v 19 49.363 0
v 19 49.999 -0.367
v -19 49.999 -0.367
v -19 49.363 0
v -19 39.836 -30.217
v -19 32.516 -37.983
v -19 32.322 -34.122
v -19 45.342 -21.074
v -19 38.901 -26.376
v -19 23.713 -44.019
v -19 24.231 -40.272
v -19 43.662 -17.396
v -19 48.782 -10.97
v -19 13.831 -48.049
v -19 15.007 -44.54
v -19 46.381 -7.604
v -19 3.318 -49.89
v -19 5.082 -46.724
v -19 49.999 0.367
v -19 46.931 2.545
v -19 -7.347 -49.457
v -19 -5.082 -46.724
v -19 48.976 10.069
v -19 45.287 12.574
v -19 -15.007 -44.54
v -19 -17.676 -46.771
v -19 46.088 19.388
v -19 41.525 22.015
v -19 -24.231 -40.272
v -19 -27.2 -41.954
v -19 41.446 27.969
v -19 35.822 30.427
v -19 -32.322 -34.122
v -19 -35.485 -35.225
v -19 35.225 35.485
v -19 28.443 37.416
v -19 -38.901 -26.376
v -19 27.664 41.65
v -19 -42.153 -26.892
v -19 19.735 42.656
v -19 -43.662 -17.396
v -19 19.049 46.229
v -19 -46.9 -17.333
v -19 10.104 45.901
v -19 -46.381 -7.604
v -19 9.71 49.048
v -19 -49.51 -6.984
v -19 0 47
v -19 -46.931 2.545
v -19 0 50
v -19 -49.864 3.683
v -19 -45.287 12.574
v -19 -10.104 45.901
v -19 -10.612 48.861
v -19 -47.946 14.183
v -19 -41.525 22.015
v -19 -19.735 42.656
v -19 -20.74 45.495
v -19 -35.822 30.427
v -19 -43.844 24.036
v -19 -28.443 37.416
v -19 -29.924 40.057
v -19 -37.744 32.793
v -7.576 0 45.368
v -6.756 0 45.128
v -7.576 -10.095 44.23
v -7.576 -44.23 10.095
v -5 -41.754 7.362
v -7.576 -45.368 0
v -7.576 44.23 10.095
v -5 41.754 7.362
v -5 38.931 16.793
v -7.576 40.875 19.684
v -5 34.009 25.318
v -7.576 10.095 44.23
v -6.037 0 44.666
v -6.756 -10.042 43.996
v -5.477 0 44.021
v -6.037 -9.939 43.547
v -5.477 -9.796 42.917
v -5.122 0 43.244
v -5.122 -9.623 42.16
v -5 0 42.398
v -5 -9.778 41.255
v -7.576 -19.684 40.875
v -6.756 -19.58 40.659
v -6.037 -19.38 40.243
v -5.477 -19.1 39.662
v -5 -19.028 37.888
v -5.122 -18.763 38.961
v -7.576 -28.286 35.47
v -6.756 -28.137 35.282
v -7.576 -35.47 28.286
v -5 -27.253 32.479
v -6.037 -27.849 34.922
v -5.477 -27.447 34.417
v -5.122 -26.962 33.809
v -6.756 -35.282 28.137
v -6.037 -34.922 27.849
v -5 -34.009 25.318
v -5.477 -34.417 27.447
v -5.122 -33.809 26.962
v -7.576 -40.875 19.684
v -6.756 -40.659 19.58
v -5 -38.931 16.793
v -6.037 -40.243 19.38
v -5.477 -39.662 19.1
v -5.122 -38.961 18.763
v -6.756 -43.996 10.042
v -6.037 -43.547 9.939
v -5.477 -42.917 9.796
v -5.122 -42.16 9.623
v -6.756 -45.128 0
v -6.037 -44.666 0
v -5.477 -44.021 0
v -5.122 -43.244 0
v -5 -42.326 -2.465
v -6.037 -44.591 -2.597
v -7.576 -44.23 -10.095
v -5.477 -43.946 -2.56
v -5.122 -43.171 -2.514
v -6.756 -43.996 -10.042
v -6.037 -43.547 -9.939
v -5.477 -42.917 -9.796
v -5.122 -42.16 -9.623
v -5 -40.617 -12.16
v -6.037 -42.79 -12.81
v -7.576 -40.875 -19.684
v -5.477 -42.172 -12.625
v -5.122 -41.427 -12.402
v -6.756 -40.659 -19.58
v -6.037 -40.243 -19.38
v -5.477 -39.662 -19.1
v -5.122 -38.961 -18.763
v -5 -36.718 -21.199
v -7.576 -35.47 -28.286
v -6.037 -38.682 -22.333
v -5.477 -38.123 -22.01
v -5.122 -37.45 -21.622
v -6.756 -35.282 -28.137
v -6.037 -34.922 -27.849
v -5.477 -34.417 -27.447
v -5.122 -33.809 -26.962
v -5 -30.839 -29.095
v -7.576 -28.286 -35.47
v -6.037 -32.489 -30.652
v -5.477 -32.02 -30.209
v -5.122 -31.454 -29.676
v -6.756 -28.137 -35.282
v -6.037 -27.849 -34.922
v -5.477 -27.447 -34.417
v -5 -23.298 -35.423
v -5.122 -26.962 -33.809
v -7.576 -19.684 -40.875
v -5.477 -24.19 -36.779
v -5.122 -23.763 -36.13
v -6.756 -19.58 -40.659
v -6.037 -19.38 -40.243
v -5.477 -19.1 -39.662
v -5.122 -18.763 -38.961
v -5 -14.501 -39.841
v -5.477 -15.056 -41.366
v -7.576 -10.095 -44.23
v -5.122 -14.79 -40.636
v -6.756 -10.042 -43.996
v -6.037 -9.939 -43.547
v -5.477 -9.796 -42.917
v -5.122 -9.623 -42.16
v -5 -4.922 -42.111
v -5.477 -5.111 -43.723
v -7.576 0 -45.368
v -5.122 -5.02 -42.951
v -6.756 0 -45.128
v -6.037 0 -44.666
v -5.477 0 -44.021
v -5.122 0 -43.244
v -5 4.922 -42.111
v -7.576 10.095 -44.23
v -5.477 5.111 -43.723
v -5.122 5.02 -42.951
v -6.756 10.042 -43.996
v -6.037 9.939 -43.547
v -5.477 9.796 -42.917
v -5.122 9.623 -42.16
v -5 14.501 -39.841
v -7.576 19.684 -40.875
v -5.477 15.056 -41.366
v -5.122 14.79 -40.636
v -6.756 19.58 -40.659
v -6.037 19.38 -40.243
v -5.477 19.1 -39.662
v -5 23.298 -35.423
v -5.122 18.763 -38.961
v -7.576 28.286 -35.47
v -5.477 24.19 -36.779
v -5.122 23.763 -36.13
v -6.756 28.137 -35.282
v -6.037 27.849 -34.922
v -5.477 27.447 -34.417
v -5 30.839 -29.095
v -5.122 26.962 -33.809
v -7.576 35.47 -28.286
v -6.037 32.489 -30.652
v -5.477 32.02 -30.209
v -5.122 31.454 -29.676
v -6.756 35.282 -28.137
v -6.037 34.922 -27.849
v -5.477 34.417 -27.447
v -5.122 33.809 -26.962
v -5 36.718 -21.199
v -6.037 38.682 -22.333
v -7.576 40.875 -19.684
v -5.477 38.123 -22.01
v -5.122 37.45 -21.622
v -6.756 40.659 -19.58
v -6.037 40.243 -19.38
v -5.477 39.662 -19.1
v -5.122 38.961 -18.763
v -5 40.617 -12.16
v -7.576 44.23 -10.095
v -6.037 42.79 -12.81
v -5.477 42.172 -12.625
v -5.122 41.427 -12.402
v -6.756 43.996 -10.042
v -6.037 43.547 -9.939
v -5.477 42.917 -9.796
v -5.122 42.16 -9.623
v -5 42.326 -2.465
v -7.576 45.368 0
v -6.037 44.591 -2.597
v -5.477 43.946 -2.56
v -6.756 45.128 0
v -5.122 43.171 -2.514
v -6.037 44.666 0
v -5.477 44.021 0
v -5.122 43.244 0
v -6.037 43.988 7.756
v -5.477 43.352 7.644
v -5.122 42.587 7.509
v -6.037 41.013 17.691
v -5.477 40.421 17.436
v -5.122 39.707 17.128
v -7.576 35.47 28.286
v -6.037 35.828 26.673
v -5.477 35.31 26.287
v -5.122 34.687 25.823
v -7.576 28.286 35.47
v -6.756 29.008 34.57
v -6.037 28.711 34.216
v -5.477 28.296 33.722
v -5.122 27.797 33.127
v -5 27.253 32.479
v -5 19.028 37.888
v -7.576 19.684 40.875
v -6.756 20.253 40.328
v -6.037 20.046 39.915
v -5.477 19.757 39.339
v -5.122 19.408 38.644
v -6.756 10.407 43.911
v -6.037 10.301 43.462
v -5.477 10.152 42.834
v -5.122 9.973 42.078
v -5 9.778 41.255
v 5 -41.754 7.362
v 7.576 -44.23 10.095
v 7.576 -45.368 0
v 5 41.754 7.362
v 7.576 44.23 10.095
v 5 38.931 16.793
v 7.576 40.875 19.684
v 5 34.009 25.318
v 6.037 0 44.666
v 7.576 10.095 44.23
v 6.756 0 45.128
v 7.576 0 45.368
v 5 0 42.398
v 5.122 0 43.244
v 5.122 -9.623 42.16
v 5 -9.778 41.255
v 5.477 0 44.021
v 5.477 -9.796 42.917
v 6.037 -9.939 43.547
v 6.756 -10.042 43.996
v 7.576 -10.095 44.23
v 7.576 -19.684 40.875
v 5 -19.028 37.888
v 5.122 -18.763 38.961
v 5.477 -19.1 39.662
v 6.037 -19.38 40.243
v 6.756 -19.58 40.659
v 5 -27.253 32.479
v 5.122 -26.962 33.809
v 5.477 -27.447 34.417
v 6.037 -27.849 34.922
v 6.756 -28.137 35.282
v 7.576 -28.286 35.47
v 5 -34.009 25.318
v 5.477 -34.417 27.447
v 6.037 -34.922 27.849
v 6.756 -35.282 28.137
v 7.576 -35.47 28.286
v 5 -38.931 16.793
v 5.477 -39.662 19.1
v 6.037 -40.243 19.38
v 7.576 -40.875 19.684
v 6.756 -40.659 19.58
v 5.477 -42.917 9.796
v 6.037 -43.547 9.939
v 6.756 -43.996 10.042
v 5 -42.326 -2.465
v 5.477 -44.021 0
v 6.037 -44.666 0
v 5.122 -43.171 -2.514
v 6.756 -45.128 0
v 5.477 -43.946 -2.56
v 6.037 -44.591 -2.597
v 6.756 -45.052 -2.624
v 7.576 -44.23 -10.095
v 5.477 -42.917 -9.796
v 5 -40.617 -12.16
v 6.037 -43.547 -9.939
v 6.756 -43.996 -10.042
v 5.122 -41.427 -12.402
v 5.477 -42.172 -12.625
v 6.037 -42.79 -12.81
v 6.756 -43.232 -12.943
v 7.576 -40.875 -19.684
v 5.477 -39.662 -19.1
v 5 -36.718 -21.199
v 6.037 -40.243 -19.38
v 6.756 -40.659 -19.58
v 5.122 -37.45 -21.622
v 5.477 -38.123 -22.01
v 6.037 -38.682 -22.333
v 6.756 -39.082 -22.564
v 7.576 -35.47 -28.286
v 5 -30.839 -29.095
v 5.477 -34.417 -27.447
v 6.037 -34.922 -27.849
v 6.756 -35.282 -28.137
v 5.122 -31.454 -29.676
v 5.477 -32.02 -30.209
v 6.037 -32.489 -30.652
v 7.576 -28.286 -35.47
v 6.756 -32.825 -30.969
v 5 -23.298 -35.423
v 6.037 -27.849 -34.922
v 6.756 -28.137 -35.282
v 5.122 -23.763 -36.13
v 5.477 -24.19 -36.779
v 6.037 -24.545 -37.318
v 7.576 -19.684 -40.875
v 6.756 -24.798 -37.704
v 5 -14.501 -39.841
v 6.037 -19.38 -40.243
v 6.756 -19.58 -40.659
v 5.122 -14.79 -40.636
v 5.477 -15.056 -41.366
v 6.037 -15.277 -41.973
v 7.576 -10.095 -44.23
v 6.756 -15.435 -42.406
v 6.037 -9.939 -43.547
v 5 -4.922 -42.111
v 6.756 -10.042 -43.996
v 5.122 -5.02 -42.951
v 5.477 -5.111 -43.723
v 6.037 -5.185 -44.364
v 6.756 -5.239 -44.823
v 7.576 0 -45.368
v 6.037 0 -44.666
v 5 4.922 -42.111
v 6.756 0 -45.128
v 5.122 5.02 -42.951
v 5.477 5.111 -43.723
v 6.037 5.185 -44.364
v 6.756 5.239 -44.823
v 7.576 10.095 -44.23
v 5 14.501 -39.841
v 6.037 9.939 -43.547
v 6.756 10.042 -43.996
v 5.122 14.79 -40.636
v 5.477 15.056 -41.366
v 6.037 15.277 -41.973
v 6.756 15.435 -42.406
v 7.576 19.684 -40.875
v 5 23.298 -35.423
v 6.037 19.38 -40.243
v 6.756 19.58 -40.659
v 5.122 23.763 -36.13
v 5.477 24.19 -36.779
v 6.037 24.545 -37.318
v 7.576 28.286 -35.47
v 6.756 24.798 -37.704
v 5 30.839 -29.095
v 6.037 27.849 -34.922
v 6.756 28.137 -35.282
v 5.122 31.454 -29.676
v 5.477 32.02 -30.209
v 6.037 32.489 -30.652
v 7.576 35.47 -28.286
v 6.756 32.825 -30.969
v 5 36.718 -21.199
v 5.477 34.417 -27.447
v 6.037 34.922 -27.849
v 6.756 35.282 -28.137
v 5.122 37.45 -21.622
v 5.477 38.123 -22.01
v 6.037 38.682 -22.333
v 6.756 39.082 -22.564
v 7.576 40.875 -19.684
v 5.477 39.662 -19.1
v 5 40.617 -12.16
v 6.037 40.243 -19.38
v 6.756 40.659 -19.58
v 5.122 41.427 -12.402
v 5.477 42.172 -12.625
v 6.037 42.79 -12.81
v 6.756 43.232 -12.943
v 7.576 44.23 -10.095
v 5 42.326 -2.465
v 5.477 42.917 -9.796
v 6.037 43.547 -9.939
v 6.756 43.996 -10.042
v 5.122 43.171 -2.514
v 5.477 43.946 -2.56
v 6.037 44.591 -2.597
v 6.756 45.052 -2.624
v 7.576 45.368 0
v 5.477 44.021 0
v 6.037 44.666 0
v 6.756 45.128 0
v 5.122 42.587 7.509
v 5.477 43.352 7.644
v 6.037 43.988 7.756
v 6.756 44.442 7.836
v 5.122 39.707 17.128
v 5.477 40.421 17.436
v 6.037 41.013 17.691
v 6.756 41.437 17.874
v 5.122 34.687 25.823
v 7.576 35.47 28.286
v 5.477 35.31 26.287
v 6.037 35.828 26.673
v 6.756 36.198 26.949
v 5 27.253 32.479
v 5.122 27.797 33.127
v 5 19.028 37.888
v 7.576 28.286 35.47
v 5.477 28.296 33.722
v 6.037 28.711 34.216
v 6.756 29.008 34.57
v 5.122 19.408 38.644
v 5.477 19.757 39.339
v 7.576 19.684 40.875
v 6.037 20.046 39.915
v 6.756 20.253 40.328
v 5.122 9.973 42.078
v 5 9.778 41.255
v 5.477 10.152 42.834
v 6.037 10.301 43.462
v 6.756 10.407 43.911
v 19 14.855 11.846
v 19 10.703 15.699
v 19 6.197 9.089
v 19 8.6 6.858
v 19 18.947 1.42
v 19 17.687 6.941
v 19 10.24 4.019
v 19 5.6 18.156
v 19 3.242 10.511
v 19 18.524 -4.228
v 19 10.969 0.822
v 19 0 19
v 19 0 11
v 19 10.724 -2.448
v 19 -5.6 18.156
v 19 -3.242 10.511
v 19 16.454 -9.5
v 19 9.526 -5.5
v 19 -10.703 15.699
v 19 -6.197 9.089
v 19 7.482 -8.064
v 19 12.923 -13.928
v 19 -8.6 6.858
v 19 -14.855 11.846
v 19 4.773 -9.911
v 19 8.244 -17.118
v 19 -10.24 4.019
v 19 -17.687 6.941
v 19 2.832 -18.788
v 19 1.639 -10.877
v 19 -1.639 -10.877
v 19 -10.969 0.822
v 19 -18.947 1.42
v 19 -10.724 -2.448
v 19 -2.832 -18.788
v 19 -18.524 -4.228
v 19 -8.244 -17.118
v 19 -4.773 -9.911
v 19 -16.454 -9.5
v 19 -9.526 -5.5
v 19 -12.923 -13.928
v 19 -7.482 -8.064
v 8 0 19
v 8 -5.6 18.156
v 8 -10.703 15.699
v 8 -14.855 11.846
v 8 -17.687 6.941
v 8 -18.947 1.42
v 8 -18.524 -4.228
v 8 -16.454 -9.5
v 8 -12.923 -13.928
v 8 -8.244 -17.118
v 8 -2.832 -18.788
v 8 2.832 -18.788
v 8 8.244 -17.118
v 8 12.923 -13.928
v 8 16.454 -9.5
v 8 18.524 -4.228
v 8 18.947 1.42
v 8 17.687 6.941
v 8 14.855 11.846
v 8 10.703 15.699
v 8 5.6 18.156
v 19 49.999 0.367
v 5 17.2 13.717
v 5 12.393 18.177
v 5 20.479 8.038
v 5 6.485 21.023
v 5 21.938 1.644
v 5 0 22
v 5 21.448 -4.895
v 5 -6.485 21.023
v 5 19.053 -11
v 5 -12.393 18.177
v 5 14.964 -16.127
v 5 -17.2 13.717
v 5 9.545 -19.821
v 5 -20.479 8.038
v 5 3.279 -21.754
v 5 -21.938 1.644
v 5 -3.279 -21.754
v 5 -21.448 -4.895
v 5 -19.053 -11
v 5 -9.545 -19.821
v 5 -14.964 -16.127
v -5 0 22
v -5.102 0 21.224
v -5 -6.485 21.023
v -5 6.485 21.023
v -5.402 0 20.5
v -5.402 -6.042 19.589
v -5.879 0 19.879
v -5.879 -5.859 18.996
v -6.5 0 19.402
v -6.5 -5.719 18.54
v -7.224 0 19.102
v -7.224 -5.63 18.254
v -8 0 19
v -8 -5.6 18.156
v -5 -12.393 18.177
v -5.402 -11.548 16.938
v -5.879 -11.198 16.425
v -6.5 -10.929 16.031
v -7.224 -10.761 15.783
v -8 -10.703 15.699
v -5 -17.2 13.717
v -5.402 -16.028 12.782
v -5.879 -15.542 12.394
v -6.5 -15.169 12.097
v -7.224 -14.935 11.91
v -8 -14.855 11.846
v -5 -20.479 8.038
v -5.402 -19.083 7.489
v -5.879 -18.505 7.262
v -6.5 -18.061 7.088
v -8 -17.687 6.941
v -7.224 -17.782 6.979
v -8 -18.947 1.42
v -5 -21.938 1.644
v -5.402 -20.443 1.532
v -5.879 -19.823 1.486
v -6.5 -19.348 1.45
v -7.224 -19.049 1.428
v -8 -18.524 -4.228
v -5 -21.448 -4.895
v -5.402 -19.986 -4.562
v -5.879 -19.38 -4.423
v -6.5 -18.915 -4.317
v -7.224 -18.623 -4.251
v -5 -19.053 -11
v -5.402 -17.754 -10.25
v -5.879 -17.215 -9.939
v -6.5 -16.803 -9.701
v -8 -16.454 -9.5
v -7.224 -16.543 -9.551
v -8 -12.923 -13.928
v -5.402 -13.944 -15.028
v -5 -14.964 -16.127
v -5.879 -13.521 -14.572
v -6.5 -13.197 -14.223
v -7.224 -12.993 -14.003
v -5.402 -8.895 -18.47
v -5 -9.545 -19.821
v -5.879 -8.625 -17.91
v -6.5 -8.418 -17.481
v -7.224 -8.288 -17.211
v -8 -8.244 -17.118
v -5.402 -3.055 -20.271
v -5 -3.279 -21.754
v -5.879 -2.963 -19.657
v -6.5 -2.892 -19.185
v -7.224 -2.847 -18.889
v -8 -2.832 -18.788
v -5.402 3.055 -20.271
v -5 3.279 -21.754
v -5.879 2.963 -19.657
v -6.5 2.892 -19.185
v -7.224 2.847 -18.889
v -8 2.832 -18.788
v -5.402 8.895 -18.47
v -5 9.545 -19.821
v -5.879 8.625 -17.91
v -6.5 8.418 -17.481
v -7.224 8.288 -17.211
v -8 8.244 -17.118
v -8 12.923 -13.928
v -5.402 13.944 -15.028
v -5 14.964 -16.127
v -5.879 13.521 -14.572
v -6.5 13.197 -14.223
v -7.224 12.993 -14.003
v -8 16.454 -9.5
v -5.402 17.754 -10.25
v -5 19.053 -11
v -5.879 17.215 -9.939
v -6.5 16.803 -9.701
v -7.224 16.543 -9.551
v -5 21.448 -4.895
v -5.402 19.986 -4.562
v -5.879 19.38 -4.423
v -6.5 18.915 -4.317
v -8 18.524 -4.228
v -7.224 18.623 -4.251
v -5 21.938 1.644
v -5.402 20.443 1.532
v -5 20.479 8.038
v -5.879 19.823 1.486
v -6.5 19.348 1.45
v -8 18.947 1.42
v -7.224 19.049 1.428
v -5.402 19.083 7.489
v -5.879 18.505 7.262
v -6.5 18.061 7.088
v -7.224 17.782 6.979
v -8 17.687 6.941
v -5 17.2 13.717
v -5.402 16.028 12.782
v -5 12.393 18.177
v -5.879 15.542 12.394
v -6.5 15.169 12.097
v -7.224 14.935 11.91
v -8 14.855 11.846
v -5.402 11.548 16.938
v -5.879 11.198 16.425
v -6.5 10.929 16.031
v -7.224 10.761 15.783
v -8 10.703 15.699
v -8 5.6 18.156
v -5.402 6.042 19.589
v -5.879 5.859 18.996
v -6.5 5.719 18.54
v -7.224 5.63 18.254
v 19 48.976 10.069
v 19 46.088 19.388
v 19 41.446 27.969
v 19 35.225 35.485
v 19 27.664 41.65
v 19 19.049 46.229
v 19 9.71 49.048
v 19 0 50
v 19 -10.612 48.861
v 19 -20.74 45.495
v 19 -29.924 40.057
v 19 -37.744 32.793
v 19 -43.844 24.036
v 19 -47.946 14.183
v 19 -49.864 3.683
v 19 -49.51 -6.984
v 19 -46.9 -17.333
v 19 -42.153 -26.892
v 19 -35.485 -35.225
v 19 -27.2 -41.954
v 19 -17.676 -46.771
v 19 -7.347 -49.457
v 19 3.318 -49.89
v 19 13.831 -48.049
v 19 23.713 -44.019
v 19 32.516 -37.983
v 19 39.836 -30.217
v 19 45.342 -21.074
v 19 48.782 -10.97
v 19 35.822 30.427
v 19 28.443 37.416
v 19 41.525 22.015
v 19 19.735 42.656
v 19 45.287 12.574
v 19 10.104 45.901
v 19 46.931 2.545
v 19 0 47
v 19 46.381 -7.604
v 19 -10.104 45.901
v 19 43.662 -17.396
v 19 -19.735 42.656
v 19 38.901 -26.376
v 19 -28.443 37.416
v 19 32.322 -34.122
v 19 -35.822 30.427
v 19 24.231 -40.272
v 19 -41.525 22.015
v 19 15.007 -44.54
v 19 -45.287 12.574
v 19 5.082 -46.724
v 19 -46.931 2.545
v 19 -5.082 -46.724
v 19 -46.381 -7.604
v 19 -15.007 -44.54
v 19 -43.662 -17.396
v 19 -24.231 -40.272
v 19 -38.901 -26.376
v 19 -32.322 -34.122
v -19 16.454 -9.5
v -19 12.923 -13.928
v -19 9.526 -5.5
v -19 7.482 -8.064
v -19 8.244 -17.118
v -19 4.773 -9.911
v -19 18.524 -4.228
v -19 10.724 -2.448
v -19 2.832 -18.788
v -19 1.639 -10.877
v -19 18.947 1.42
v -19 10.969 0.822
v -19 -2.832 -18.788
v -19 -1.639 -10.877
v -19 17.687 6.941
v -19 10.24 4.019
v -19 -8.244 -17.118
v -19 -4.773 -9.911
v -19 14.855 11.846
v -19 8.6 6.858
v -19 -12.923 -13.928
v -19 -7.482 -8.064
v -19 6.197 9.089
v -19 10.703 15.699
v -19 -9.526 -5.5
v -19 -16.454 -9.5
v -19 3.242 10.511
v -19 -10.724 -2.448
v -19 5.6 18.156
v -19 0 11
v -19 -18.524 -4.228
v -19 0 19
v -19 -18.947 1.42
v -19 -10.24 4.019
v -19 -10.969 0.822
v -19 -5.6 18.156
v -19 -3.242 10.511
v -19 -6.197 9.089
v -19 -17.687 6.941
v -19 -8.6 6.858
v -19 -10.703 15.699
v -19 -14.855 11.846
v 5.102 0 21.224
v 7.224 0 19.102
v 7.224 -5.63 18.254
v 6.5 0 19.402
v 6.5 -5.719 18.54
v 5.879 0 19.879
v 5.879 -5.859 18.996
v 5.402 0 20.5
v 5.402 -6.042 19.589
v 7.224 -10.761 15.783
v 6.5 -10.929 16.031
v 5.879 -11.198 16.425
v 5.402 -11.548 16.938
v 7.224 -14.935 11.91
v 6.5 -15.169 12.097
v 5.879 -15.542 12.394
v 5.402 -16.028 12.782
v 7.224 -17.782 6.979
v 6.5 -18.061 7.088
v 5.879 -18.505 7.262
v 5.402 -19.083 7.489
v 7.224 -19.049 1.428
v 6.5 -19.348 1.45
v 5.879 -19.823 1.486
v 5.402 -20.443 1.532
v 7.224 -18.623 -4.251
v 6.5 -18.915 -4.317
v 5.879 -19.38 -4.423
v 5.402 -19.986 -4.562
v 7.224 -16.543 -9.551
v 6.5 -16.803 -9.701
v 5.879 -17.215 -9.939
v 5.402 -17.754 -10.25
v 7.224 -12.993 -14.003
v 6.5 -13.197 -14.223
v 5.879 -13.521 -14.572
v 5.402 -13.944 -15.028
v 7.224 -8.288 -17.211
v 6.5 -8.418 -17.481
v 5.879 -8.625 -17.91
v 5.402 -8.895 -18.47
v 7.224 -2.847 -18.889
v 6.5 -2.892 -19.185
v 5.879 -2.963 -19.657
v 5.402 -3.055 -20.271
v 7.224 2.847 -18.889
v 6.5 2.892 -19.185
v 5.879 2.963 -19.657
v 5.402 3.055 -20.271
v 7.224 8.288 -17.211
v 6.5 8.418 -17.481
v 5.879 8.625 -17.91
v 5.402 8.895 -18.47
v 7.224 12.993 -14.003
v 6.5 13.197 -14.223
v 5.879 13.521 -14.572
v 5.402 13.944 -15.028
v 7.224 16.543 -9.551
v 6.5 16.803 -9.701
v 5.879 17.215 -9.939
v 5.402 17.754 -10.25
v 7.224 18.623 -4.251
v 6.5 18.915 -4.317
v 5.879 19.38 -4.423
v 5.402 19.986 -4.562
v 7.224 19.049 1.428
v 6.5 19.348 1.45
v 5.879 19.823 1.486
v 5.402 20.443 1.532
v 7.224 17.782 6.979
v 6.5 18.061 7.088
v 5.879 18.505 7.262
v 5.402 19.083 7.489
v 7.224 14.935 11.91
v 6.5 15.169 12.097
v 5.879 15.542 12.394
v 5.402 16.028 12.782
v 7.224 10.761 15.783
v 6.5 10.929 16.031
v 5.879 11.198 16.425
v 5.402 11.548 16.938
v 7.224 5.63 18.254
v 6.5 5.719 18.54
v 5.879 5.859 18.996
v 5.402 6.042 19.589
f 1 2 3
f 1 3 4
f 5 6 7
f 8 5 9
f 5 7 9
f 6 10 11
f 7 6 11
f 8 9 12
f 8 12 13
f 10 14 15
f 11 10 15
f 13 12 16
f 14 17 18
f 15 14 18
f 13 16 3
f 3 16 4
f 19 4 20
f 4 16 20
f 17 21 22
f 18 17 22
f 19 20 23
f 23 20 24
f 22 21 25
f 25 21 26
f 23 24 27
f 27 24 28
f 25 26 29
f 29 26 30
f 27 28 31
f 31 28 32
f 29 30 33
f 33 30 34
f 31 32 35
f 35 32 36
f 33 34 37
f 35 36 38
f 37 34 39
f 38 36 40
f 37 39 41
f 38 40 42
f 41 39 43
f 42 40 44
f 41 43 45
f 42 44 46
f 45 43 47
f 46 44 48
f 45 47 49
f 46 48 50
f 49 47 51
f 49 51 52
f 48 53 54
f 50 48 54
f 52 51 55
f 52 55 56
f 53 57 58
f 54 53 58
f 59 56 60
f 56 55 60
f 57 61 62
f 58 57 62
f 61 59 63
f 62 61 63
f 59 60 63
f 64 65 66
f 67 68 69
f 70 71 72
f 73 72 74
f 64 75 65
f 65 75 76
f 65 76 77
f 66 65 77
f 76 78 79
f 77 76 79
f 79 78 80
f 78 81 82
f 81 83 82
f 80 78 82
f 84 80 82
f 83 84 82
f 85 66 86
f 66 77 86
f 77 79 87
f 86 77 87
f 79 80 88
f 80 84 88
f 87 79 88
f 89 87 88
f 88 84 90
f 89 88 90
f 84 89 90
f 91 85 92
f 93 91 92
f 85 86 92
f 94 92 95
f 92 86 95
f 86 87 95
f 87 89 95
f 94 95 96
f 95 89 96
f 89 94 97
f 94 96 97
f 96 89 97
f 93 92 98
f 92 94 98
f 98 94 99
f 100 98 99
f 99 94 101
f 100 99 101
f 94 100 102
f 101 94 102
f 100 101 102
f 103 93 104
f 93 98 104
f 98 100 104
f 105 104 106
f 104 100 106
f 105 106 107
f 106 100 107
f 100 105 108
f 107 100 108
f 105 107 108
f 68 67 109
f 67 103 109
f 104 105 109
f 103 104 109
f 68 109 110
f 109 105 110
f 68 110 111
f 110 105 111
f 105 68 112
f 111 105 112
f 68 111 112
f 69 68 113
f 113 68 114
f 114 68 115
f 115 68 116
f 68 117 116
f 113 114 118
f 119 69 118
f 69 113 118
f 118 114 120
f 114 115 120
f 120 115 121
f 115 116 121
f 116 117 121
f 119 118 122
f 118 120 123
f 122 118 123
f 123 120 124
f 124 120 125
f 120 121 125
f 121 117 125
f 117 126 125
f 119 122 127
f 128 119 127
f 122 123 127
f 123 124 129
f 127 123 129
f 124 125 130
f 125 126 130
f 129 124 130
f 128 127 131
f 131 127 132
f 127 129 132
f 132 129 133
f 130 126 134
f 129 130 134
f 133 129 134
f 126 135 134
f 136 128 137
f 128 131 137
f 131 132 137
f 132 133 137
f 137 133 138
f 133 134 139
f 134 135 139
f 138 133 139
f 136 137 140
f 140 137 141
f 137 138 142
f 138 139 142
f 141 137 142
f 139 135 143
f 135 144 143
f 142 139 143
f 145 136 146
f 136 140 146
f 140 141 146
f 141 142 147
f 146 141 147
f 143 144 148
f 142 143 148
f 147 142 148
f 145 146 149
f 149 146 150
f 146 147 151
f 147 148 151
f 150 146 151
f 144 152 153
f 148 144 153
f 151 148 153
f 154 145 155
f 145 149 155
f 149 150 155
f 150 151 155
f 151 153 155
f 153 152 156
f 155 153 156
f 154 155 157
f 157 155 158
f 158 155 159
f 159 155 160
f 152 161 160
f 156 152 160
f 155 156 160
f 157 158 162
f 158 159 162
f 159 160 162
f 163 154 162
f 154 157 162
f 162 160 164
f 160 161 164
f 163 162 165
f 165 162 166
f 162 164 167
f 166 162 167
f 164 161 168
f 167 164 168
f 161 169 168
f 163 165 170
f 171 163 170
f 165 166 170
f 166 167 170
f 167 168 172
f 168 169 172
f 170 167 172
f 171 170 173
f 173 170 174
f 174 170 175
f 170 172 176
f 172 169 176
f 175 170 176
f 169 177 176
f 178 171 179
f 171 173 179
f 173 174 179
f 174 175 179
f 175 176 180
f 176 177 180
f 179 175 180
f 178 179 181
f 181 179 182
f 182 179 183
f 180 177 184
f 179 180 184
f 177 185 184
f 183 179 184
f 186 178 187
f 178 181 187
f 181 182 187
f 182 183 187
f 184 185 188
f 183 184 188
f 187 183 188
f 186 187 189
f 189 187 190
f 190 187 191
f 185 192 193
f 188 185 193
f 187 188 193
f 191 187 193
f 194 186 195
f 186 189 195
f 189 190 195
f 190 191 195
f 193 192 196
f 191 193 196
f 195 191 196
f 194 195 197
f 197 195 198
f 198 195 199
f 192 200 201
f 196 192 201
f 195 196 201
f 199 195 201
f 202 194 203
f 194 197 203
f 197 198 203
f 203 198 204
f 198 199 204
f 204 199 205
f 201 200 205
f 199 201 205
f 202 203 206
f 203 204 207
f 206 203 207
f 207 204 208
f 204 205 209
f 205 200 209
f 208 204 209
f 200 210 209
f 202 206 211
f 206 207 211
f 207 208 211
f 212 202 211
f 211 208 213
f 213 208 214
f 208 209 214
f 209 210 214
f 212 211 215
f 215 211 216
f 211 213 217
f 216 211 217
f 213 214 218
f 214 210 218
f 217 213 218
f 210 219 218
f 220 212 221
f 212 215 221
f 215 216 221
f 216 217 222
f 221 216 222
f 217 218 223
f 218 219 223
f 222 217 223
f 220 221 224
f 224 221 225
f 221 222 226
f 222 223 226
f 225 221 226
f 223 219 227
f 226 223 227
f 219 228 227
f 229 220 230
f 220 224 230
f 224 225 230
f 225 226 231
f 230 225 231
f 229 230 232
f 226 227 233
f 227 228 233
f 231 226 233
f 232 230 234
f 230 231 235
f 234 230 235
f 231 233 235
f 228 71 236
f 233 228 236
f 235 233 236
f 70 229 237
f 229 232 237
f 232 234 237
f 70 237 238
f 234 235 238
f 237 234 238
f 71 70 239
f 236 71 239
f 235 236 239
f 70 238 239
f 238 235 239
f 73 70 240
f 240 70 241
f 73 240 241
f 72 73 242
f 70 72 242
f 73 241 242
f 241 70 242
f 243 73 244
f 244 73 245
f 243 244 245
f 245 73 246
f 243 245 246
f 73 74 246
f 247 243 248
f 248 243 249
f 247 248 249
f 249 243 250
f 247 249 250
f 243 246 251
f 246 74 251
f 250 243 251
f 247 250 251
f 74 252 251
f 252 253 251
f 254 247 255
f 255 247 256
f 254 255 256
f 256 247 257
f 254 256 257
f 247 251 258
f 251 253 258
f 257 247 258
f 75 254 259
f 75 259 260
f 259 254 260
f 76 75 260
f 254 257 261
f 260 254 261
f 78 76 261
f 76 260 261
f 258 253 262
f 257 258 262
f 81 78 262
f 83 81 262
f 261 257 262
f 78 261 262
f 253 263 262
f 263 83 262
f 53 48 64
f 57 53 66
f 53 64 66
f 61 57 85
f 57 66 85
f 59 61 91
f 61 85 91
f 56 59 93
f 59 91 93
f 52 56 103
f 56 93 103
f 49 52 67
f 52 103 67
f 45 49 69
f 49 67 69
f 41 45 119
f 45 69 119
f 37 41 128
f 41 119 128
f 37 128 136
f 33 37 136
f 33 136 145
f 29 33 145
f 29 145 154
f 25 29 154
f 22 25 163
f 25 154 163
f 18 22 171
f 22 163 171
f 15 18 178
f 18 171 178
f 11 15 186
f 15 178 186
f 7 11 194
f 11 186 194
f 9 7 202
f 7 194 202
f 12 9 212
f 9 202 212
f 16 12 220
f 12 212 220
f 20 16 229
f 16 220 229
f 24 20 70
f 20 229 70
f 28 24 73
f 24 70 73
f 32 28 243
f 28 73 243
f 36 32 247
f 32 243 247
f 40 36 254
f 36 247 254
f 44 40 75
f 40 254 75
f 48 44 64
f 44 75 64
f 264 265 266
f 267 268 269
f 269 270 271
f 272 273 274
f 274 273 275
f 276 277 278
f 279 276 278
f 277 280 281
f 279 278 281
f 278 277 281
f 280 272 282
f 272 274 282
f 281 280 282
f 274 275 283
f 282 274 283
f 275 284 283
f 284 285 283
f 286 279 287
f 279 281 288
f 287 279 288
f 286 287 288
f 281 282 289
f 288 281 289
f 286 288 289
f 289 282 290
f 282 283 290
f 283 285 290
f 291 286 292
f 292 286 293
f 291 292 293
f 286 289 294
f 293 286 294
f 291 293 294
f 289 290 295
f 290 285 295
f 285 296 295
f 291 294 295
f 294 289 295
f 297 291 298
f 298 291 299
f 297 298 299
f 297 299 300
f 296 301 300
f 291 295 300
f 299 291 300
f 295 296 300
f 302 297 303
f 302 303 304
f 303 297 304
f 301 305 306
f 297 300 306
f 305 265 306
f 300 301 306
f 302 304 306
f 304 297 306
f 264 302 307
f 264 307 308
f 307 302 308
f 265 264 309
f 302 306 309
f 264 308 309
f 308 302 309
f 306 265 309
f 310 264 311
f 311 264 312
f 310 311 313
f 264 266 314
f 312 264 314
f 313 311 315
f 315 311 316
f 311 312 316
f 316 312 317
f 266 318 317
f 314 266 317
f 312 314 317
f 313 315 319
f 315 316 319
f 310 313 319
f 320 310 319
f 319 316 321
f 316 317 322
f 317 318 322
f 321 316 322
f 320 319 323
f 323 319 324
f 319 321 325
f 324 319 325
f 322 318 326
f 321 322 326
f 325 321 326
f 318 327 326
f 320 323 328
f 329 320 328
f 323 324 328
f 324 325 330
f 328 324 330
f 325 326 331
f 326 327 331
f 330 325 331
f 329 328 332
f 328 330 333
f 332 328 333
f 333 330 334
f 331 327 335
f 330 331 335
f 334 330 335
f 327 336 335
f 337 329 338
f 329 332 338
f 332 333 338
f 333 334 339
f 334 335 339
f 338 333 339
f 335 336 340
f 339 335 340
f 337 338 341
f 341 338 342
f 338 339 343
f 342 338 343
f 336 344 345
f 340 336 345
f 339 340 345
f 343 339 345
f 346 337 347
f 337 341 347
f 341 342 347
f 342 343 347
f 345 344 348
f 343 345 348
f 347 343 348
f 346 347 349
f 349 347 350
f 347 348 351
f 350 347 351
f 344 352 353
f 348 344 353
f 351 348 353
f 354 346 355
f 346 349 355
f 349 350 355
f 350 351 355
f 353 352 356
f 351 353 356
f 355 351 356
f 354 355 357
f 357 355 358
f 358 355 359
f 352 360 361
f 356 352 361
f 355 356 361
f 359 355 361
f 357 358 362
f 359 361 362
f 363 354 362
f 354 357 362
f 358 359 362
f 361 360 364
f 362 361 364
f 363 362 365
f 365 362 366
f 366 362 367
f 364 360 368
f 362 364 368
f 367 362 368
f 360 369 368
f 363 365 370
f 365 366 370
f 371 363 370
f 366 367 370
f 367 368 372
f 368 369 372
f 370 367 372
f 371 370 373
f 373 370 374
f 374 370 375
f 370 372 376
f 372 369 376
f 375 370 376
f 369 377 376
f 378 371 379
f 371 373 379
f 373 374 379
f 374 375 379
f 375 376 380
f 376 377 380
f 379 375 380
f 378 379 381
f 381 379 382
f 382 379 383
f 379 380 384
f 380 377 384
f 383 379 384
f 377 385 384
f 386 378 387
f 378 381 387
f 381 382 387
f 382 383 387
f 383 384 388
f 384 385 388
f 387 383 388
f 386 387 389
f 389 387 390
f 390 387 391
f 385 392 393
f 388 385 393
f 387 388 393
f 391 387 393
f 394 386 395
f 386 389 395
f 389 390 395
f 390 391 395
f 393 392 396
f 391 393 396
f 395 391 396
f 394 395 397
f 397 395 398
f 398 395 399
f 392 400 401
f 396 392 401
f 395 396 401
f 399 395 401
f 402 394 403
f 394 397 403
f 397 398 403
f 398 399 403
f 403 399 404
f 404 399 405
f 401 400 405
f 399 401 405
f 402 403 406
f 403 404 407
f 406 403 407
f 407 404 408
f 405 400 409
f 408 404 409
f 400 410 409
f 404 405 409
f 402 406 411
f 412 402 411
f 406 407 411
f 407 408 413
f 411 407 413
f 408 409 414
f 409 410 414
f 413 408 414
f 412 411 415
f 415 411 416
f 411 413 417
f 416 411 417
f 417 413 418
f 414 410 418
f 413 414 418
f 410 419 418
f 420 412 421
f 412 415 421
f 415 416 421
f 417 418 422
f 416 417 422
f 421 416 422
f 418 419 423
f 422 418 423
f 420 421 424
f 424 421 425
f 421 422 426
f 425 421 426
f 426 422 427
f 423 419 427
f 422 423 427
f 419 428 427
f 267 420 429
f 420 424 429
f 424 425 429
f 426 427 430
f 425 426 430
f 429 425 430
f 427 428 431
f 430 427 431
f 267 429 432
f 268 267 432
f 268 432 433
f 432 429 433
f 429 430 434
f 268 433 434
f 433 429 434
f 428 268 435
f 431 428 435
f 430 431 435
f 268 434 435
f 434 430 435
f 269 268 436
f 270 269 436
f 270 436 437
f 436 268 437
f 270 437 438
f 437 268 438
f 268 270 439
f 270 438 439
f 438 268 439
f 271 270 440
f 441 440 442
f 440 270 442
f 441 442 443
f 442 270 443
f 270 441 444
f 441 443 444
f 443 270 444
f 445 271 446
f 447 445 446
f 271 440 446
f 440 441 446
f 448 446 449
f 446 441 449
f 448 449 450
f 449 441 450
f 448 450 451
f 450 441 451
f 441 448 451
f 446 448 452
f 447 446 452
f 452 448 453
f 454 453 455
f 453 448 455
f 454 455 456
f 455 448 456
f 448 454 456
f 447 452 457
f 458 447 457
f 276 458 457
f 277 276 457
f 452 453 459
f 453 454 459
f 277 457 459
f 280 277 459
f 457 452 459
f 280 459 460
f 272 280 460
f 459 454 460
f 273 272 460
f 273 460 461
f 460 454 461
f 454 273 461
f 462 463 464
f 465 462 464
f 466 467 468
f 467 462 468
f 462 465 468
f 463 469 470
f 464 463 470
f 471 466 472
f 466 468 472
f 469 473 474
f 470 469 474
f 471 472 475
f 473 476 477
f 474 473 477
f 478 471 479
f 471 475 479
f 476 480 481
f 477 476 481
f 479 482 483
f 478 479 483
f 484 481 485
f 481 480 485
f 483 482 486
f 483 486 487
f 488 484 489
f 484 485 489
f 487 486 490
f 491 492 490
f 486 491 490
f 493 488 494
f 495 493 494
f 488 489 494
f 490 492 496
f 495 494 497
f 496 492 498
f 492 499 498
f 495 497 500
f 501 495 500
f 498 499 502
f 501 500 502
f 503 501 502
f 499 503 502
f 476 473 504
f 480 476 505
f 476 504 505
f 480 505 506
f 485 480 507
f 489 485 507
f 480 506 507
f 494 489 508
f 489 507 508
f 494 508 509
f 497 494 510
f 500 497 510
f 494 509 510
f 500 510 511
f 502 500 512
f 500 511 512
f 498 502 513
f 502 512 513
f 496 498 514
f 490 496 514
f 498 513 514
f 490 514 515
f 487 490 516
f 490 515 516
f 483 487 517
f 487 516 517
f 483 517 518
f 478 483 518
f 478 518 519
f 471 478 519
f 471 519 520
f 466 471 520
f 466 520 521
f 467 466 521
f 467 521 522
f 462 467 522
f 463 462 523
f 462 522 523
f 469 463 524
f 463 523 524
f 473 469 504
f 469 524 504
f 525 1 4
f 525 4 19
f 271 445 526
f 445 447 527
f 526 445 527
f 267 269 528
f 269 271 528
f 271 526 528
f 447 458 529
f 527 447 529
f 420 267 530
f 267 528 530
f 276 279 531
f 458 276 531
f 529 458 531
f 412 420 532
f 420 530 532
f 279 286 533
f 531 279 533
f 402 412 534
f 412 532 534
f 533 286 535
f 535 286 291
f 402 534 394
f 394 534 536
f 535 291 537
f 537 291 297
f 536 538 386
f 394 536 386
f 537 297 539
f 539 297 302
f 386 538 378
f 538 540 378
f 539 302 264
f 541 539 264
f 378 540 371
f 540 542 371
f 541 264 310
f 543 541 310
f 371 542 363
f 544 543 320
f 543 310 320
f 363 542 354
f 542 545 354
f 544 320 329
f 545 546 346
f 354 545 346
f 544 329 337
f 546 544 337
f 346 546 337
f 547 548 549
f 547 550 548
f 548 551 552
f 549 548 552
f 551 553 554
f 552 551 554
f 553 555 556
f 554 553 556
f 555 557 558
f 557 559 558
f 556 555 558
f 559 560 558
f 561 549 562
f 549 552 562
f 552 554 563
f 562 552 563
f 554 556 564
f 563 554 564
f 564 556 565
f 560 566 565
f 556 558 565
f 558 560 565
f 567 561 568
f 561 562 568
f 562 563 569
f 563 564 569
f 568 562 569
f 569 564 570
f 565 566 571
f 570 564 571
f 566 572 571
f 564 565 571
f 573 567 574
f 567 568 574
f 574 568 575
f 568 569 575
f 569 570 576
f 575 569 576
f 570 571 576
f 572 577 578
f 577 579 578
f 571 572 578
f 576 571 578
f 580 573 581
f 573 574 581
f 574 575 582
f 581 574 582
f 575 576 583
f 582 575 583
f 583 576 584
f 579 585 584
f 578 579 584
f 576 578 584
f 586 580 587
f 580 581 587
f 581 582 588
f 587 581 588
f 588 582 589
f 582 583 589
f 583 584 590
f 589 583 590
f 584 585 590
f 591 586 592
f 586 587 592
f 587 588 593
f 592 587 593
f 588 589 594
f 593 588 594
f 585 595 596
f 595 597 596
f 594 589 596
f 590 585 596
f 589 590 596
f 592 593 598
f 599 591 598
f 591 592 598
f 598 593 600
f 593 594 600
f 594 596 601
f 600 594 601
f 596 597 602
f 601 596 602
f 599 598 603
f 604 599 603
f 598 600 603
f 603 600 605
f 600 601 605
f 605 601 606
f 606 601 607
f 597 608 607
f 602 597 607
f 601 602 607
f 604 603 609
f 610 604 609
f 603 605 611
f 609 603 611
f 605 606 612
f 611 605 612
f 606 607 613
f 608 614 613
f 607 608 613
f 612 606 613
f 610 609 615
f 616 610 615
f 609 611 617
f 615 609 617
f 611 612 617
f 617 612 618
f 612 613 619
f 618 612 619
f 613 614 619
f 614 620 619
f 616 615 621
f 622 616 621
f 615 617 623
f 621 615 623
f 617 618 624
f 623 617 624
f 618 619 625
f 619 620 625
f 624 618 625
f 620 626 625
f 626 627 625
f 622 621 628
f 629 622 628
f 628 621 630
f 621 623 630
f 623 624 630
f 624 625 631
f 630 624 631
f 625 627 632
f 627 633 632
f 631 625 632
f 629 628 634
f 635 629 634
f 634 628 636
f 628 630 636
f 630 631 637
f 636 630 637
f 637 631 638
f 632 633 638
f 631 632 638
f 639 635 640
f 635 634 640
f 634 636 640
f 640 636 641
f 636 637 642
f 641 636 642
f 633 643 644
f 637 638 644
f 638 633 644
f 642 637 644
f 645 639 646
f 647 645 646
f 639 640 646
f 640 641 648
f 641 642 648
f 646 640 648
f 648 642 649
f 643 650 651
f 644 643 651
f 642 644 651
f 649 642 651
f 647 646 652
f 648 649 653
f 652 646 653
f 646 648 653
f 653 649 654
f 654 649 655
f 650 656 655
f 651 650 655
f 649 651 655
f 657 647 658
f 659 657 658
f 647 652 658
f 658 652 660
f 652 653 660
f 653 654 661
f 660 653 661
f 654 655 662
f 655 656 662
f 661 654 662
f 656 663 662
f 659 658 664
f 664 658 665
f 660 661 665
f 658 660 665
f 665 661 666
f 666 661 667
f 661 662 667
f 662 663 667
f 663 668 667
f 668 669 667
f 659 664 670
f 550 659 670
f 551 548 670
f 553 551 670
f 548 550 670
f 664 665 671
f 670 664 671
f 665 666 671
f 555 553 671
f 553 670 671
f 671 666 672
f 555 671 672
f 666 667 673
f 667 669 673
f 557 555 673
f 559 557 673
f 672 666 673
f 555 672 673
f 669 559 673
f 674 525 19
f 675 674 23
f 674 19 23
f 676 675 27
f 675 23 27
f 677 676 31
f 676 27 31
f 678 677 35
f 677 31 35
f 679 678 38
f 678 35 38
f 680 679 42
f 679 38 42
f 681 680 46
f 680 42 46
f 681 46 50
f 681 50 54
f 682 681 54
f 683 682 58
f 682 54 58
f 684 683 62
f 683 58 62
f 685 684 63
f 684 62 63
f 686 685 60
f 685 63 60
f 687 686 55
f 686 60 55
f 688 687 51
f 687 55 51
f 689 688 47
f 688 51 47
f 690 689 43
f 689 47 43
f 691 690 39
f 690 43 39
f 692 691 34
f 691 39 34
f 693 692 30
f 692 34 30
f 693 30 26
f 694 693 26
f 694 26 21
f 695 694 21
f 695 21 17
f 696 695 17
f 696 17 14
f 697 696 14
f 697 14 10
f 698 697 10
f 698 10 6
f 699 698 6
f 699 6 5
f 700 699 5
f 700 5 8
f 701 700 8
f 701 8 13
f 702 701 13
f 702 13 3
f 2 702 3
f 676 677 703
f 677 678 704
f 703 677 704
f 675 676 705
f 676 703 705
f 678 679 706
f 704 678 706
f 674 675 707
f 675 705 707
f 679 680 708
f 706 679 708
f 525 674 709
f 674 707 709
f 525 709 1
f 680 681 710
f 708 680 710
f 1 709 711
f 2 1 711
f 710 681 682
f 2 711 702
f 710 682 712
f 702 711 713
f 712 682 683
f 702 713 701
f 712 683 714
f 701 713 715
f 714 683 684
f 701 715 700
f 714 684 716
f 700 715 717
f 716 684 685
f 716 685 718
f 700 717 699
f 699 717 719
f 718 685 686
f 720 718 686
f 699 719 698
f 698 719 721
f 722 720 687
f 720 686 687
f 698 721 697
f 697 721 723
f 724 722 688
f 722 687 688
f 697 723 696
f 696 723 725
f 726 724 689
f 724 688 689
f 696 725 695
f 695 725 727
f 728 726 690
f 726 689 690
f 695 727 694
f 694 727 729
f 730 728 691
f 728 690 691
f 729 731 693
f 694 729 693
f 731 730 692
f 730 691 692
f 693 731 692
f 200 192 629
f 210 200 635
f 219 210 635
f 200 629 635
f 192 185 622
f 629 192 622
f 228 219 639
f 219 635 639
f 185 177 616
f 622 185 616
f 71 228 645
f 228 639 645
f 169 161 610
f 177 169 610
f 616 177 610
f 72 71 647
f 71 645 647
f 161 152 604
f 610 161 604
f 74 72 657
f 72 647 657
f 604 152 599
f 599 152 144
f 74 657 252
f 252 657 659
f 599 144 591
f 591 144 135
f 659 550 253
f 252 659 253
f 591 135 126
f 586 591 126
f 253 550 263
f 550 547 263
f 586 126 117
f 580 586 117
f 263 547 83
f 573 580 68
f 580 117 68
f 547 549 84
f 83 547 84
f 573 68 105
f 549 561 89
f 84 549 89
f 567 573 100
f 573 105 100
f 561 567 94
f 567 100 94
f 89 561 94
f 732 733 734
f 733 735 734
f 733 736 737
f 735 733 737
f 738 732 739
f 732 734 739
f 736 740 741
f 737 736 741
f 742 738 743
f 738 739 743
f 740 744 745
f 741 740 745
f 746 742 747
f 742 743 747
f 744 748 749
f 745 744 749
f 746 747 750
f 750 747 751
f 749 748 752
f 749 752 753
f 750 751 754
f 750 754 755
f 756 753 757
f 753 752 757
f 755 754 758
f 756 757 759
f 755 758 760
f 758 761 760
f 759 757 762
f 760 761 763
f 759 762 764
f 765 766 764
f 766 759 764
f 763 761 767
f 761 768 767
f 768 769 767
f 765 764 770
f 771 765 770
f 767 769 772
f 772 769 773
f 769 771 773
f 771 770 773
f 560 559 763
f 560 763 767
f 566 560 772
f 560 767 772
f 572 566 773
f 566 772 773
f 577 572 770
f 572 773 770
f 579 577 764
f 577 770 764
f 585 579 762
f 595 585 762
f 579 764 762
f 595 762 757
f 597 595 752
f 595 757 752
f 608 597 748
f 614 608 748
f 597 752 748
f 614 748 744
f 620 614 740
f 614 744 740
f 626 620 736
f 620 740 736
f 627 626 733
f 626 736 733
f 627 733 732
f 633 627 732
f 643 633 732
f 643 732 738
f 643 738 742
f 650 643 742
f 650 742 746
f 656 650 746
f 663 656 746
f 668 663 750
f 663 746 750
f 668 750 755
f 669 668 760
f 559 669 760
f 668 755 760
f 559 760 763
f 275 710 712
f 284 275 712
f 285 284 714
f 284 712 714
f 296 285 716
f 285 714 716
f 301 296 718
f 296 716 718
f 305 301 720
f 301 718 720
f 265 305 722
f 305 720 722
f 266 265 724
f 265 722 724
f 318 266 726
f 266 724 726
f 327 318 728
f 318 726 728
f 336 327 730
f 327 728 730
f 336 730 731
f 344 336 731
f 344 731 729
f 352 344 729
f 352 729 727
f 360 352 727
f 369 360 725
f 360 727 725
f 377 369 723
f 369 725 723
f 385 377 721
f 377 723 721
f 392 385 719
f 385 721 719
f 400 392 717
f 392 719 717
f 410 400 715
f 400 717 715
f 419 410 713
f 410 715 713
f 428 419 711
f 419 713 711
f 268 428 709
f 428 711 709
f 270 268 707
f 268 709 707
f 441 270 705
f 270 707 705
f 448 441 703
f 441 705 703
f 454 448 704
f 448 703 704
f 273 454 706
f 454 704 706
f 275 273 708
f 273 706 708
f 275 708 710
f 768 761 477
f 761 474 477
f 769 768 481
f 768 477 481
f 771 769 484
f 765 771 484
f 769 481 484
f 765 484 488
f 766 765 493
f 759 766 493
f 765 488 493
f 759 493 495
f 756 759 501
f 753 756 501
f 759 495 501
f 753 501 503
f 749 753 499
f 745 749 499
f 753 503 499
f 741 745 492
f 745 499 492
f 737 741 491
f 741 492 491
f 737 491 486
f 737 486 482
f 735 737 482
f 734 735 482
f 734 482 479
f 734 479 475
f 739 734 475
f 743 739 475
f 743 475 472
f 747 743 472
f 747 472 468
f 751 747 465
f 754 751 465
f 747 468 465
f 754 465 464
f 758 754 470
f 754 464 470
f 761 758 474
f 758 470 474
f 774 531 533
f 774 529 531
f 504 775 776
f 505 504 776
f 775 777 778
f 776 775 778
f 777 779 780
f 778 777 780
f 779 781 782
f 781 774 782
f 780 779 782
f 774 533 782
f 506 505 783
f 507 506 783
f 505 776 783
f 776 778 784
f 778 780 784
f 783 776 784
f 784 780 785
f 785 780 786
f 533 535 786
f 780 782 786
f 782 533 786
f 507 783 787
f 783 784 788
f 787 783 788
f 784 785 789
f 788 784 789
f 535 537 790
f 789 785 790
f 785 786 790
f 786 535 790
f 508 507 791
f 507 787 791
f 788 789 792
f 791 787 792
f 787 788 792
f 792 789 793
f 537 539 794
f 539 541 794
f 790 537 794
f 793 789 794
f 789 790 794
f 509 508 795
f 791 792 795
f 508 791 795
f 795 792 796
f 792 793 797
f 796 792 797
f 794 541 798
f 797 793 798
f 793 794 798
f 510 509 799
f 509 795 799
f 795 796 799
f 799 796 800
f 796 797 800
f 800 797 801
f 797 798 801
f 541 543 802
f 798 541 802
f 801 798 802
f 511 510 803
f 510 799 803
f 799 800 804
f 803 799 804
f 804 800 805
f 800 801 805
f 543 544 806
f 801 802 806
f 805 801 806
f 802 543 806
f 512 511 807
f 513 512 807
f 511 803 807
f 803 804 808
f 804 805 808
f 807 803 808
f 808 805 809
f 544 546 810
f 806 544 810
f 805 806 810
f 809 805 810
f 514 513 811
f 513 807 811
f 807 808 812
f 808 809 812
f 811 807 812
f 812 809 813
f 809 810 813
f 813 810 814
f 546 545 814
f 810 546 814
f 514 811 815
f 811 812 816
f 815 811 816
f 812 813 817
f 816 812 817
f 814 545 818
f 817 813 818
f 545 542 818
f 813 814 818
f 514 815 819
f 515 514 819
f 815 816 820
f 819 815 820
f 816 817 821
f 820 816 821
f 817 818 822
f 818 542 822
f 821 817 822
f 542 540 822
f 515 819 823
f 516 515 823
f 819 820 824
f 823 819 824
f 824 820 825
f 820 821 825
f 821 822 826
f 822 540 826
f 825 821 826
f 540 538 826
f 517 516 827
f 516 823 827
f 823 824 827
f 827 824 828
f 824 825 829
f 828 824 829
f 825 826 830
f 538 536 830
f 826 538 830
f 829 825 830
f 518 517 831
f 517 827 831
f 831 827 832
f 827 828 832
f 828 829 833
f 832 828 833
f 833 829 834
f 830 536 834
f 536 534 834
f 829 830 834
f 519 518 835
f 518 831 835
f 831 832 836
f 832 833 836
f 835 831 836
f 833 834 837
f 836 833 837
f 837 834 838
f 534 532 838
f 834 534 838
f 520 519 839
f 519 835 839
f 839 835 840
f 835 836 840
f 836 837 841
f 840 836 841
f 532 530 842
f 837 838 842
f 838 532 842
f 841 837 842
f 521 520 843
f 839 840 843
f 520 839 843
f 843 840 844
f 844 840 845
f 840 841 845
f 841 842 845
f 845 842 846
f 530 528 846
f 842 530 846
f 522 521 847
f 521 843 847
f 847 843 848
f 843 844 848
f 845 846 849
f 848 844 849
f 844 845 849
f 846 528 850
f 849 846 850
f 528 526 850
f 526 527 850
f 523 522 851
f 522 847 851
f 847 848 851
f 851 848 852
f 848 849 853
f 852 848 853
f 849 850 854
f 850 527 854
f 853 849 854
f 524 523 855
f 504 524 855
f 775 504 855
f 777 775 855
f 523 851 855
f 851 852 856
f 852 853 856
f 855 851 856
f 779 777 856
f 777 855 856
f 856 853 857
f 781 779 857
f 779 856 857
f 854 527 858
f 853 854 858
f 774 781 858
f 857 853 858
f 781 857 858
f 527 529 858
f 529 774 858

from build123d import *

# Parameters (mm, degrees)
FILLET_1_R          = 3
CUT_EXTRUDE_1_DEPTH = 81.274528962


with BuildPart() as part:
    # 草圖1 → 旋轉1 (revolve)
    with BuildSketch(Plane.XY, mode=Mode.PRIVATE) as revolve_1_sk:
        Polygon((-19, 11), (19, 11), (19, 19), (5, 19), (5, 45), (19, 47), (19, 50), (-19, 50), (-19, 47), (-5, 45), (-5, 19), (-19, 19), align=None)
    revolve(revolve_1_sk.sketch.rotate(Axis((-30.665853659, 0, 0), (1, 0, 0)), 90), axis=Axis((-30.665853659, 0, 0), (1, 0, 0)))

    # 圓角1
    fillet_1_edges = [part.edges().sort_by_distance(p)[0] for p in [
        (-5, 0, -19),
        (5, 0, -19),
        (5, 0, -45),
        (-5, 0, -45),
    ]]
    fillet(fillet_1_edges, radius=FILLET_1_R)

    # 草圖2 → 伸長1 (cut, through all)
    with BuildSketch(Plane(origin=(19, 0, 0), x_dir=(0, 0, -1), z_dir=(1, 0, 0))):
        Polygon((-0.913442032, 50.94560231), (0.913442032, 50.94560231), (0, 49.363474301), align=None)
    extrude(amount=-CUT_EXTRUDE_1_DEPTH, mode=Mode.SUBTRACT)


solid = part.part
